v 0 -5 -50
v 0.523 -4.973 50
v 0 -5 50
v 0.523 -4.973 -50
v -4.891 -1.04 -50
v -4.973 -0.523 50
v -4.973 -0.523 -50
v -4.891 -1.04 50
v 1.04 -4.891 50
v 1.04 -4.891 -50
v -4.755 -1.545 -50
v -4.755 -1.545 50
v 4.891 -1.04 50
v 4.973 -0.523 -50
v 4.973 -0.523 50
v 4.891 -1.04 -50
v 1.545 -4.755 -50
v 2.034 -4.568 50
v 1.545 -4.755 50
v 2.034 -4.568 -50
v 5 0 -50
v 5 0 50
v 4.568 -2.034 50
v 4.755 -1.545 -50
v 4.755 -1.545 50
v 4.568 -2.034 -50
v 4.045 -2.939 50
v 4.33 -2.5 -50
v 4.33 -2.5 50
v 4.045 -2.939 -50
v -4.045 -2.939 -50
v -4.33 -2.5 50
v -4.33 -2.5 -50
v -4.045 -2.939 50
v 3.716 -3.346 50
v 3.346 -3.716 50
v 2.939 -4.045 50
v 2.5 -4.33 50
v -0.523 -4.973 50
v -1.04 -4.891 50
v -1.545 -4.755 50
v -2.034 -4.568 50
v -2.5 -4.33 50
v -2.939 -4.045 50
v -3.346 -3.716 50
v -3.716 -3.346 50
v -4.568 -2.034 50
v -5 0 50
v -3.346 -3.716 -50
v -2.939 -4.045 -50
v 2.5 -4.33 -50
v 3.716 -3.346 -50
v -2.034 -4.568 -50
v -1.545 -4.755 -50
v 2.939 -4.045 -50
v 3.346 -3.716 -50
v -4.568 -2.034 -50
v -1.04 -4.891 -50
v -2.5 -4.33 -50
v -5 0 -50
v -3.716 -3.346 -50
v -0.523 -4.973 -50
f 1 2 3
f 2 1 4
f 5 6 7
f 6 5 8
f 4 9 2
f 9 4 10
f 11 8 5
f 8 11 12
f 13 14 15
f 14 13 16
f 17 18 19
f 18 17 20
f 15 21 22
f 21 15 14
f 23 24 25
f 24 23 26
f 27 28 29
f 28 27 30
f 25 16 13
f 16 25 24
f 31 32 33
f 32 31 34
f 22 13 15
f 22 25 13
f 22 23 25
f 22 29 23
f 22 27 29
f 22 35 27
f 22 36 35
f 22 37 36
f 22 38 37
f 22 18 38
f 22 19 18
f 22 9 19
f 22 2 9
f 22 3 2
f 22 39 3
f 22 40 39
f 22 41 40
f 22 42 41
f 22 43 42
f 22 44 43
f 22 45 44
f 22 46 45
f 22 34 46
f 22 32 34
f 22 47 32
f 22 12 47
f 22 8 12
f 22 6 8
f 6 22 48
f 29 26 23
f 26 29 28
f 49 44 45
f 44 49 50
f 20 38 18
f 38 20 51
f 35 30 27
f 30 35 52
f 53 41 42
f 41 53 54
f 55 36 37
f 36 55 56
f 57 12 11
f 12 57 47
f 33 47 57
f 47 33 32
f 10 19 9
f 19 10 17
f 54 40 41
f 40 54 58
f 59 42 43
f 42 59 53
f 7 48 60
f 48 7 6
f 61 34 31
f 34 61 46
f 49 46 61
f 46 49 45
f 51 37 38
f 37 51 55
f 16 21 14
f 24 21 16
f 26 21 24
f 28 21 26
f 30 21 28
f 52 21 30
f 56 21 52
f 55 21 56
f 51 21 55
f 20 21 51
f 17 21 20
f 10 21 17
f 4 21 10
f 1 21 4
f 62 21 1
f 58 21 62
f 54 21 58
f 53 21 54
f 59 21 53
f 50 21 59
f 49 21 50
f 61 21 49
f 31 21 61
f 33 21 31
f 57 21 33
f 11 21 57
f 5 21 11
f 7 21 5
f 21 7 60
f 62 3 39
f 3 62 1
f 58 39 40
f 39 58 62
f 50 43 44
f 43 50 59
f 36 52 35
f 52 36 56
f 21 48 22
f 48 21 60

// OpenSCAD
// =========================================================
// OpenSCAD Code: 100mm 圓柱體切割成半圓柱 (Half Cylinder)
// =========================================================

// 設定曲面平滑度 (數值越大越平滑)
$fn = 60;

// --- 尺寸變數 ---
cylinder_length = 100; // 圓柱體長度
outer_radius = 5;      // 圓柱體半徑

// --- 主體與切割體 ---
difference() {

    // 1. 主要圓柱體 (Main Cylinder)
    // 圓柱體長度為100，半徑為5。
    // center=true 使圓柱體中心位於 [0, 0, 0]，沿著 Z 軸延伸。
    cylinder(
        h = cylinder_length,
        r = outer_radius,
        center = true
    );

    // 2. 切割用的立方體 (The Cutter/Box)
    // 我們需要一個足夠大的立方體來切掉圓柱體的「上半部」（Y > 0 的部分）。

    // 定義立方體尺寸：
    // X軸：略大於直徑 (10 + 2 = 12)
    // Y軸：略大於半徑 (5 + 1 = 6)
    // Z軸：等於圓柱體長度 (100)

    // 將立方體移動到正確的切割位置：
    // 為了讓立方體的底部邊緣精確對齊圓柱體的中心軸 (Z軸)，
    // 我們將其中心點從 [0, 0, 0] 移動到 [X_offset, Y_offset, Z_offset]。
    translate(v = [-outer_radius - 1, 0, -cylinder_length/2])
    {
        // 立方體從 Y=0 開始向正 Y 方向延伸，完美覆蓋圓柱體的上半部。
        cube(
            size = [outer_radius * 2 + 2, outer_radius + 1, cylinder_length]
        );
    }
}
